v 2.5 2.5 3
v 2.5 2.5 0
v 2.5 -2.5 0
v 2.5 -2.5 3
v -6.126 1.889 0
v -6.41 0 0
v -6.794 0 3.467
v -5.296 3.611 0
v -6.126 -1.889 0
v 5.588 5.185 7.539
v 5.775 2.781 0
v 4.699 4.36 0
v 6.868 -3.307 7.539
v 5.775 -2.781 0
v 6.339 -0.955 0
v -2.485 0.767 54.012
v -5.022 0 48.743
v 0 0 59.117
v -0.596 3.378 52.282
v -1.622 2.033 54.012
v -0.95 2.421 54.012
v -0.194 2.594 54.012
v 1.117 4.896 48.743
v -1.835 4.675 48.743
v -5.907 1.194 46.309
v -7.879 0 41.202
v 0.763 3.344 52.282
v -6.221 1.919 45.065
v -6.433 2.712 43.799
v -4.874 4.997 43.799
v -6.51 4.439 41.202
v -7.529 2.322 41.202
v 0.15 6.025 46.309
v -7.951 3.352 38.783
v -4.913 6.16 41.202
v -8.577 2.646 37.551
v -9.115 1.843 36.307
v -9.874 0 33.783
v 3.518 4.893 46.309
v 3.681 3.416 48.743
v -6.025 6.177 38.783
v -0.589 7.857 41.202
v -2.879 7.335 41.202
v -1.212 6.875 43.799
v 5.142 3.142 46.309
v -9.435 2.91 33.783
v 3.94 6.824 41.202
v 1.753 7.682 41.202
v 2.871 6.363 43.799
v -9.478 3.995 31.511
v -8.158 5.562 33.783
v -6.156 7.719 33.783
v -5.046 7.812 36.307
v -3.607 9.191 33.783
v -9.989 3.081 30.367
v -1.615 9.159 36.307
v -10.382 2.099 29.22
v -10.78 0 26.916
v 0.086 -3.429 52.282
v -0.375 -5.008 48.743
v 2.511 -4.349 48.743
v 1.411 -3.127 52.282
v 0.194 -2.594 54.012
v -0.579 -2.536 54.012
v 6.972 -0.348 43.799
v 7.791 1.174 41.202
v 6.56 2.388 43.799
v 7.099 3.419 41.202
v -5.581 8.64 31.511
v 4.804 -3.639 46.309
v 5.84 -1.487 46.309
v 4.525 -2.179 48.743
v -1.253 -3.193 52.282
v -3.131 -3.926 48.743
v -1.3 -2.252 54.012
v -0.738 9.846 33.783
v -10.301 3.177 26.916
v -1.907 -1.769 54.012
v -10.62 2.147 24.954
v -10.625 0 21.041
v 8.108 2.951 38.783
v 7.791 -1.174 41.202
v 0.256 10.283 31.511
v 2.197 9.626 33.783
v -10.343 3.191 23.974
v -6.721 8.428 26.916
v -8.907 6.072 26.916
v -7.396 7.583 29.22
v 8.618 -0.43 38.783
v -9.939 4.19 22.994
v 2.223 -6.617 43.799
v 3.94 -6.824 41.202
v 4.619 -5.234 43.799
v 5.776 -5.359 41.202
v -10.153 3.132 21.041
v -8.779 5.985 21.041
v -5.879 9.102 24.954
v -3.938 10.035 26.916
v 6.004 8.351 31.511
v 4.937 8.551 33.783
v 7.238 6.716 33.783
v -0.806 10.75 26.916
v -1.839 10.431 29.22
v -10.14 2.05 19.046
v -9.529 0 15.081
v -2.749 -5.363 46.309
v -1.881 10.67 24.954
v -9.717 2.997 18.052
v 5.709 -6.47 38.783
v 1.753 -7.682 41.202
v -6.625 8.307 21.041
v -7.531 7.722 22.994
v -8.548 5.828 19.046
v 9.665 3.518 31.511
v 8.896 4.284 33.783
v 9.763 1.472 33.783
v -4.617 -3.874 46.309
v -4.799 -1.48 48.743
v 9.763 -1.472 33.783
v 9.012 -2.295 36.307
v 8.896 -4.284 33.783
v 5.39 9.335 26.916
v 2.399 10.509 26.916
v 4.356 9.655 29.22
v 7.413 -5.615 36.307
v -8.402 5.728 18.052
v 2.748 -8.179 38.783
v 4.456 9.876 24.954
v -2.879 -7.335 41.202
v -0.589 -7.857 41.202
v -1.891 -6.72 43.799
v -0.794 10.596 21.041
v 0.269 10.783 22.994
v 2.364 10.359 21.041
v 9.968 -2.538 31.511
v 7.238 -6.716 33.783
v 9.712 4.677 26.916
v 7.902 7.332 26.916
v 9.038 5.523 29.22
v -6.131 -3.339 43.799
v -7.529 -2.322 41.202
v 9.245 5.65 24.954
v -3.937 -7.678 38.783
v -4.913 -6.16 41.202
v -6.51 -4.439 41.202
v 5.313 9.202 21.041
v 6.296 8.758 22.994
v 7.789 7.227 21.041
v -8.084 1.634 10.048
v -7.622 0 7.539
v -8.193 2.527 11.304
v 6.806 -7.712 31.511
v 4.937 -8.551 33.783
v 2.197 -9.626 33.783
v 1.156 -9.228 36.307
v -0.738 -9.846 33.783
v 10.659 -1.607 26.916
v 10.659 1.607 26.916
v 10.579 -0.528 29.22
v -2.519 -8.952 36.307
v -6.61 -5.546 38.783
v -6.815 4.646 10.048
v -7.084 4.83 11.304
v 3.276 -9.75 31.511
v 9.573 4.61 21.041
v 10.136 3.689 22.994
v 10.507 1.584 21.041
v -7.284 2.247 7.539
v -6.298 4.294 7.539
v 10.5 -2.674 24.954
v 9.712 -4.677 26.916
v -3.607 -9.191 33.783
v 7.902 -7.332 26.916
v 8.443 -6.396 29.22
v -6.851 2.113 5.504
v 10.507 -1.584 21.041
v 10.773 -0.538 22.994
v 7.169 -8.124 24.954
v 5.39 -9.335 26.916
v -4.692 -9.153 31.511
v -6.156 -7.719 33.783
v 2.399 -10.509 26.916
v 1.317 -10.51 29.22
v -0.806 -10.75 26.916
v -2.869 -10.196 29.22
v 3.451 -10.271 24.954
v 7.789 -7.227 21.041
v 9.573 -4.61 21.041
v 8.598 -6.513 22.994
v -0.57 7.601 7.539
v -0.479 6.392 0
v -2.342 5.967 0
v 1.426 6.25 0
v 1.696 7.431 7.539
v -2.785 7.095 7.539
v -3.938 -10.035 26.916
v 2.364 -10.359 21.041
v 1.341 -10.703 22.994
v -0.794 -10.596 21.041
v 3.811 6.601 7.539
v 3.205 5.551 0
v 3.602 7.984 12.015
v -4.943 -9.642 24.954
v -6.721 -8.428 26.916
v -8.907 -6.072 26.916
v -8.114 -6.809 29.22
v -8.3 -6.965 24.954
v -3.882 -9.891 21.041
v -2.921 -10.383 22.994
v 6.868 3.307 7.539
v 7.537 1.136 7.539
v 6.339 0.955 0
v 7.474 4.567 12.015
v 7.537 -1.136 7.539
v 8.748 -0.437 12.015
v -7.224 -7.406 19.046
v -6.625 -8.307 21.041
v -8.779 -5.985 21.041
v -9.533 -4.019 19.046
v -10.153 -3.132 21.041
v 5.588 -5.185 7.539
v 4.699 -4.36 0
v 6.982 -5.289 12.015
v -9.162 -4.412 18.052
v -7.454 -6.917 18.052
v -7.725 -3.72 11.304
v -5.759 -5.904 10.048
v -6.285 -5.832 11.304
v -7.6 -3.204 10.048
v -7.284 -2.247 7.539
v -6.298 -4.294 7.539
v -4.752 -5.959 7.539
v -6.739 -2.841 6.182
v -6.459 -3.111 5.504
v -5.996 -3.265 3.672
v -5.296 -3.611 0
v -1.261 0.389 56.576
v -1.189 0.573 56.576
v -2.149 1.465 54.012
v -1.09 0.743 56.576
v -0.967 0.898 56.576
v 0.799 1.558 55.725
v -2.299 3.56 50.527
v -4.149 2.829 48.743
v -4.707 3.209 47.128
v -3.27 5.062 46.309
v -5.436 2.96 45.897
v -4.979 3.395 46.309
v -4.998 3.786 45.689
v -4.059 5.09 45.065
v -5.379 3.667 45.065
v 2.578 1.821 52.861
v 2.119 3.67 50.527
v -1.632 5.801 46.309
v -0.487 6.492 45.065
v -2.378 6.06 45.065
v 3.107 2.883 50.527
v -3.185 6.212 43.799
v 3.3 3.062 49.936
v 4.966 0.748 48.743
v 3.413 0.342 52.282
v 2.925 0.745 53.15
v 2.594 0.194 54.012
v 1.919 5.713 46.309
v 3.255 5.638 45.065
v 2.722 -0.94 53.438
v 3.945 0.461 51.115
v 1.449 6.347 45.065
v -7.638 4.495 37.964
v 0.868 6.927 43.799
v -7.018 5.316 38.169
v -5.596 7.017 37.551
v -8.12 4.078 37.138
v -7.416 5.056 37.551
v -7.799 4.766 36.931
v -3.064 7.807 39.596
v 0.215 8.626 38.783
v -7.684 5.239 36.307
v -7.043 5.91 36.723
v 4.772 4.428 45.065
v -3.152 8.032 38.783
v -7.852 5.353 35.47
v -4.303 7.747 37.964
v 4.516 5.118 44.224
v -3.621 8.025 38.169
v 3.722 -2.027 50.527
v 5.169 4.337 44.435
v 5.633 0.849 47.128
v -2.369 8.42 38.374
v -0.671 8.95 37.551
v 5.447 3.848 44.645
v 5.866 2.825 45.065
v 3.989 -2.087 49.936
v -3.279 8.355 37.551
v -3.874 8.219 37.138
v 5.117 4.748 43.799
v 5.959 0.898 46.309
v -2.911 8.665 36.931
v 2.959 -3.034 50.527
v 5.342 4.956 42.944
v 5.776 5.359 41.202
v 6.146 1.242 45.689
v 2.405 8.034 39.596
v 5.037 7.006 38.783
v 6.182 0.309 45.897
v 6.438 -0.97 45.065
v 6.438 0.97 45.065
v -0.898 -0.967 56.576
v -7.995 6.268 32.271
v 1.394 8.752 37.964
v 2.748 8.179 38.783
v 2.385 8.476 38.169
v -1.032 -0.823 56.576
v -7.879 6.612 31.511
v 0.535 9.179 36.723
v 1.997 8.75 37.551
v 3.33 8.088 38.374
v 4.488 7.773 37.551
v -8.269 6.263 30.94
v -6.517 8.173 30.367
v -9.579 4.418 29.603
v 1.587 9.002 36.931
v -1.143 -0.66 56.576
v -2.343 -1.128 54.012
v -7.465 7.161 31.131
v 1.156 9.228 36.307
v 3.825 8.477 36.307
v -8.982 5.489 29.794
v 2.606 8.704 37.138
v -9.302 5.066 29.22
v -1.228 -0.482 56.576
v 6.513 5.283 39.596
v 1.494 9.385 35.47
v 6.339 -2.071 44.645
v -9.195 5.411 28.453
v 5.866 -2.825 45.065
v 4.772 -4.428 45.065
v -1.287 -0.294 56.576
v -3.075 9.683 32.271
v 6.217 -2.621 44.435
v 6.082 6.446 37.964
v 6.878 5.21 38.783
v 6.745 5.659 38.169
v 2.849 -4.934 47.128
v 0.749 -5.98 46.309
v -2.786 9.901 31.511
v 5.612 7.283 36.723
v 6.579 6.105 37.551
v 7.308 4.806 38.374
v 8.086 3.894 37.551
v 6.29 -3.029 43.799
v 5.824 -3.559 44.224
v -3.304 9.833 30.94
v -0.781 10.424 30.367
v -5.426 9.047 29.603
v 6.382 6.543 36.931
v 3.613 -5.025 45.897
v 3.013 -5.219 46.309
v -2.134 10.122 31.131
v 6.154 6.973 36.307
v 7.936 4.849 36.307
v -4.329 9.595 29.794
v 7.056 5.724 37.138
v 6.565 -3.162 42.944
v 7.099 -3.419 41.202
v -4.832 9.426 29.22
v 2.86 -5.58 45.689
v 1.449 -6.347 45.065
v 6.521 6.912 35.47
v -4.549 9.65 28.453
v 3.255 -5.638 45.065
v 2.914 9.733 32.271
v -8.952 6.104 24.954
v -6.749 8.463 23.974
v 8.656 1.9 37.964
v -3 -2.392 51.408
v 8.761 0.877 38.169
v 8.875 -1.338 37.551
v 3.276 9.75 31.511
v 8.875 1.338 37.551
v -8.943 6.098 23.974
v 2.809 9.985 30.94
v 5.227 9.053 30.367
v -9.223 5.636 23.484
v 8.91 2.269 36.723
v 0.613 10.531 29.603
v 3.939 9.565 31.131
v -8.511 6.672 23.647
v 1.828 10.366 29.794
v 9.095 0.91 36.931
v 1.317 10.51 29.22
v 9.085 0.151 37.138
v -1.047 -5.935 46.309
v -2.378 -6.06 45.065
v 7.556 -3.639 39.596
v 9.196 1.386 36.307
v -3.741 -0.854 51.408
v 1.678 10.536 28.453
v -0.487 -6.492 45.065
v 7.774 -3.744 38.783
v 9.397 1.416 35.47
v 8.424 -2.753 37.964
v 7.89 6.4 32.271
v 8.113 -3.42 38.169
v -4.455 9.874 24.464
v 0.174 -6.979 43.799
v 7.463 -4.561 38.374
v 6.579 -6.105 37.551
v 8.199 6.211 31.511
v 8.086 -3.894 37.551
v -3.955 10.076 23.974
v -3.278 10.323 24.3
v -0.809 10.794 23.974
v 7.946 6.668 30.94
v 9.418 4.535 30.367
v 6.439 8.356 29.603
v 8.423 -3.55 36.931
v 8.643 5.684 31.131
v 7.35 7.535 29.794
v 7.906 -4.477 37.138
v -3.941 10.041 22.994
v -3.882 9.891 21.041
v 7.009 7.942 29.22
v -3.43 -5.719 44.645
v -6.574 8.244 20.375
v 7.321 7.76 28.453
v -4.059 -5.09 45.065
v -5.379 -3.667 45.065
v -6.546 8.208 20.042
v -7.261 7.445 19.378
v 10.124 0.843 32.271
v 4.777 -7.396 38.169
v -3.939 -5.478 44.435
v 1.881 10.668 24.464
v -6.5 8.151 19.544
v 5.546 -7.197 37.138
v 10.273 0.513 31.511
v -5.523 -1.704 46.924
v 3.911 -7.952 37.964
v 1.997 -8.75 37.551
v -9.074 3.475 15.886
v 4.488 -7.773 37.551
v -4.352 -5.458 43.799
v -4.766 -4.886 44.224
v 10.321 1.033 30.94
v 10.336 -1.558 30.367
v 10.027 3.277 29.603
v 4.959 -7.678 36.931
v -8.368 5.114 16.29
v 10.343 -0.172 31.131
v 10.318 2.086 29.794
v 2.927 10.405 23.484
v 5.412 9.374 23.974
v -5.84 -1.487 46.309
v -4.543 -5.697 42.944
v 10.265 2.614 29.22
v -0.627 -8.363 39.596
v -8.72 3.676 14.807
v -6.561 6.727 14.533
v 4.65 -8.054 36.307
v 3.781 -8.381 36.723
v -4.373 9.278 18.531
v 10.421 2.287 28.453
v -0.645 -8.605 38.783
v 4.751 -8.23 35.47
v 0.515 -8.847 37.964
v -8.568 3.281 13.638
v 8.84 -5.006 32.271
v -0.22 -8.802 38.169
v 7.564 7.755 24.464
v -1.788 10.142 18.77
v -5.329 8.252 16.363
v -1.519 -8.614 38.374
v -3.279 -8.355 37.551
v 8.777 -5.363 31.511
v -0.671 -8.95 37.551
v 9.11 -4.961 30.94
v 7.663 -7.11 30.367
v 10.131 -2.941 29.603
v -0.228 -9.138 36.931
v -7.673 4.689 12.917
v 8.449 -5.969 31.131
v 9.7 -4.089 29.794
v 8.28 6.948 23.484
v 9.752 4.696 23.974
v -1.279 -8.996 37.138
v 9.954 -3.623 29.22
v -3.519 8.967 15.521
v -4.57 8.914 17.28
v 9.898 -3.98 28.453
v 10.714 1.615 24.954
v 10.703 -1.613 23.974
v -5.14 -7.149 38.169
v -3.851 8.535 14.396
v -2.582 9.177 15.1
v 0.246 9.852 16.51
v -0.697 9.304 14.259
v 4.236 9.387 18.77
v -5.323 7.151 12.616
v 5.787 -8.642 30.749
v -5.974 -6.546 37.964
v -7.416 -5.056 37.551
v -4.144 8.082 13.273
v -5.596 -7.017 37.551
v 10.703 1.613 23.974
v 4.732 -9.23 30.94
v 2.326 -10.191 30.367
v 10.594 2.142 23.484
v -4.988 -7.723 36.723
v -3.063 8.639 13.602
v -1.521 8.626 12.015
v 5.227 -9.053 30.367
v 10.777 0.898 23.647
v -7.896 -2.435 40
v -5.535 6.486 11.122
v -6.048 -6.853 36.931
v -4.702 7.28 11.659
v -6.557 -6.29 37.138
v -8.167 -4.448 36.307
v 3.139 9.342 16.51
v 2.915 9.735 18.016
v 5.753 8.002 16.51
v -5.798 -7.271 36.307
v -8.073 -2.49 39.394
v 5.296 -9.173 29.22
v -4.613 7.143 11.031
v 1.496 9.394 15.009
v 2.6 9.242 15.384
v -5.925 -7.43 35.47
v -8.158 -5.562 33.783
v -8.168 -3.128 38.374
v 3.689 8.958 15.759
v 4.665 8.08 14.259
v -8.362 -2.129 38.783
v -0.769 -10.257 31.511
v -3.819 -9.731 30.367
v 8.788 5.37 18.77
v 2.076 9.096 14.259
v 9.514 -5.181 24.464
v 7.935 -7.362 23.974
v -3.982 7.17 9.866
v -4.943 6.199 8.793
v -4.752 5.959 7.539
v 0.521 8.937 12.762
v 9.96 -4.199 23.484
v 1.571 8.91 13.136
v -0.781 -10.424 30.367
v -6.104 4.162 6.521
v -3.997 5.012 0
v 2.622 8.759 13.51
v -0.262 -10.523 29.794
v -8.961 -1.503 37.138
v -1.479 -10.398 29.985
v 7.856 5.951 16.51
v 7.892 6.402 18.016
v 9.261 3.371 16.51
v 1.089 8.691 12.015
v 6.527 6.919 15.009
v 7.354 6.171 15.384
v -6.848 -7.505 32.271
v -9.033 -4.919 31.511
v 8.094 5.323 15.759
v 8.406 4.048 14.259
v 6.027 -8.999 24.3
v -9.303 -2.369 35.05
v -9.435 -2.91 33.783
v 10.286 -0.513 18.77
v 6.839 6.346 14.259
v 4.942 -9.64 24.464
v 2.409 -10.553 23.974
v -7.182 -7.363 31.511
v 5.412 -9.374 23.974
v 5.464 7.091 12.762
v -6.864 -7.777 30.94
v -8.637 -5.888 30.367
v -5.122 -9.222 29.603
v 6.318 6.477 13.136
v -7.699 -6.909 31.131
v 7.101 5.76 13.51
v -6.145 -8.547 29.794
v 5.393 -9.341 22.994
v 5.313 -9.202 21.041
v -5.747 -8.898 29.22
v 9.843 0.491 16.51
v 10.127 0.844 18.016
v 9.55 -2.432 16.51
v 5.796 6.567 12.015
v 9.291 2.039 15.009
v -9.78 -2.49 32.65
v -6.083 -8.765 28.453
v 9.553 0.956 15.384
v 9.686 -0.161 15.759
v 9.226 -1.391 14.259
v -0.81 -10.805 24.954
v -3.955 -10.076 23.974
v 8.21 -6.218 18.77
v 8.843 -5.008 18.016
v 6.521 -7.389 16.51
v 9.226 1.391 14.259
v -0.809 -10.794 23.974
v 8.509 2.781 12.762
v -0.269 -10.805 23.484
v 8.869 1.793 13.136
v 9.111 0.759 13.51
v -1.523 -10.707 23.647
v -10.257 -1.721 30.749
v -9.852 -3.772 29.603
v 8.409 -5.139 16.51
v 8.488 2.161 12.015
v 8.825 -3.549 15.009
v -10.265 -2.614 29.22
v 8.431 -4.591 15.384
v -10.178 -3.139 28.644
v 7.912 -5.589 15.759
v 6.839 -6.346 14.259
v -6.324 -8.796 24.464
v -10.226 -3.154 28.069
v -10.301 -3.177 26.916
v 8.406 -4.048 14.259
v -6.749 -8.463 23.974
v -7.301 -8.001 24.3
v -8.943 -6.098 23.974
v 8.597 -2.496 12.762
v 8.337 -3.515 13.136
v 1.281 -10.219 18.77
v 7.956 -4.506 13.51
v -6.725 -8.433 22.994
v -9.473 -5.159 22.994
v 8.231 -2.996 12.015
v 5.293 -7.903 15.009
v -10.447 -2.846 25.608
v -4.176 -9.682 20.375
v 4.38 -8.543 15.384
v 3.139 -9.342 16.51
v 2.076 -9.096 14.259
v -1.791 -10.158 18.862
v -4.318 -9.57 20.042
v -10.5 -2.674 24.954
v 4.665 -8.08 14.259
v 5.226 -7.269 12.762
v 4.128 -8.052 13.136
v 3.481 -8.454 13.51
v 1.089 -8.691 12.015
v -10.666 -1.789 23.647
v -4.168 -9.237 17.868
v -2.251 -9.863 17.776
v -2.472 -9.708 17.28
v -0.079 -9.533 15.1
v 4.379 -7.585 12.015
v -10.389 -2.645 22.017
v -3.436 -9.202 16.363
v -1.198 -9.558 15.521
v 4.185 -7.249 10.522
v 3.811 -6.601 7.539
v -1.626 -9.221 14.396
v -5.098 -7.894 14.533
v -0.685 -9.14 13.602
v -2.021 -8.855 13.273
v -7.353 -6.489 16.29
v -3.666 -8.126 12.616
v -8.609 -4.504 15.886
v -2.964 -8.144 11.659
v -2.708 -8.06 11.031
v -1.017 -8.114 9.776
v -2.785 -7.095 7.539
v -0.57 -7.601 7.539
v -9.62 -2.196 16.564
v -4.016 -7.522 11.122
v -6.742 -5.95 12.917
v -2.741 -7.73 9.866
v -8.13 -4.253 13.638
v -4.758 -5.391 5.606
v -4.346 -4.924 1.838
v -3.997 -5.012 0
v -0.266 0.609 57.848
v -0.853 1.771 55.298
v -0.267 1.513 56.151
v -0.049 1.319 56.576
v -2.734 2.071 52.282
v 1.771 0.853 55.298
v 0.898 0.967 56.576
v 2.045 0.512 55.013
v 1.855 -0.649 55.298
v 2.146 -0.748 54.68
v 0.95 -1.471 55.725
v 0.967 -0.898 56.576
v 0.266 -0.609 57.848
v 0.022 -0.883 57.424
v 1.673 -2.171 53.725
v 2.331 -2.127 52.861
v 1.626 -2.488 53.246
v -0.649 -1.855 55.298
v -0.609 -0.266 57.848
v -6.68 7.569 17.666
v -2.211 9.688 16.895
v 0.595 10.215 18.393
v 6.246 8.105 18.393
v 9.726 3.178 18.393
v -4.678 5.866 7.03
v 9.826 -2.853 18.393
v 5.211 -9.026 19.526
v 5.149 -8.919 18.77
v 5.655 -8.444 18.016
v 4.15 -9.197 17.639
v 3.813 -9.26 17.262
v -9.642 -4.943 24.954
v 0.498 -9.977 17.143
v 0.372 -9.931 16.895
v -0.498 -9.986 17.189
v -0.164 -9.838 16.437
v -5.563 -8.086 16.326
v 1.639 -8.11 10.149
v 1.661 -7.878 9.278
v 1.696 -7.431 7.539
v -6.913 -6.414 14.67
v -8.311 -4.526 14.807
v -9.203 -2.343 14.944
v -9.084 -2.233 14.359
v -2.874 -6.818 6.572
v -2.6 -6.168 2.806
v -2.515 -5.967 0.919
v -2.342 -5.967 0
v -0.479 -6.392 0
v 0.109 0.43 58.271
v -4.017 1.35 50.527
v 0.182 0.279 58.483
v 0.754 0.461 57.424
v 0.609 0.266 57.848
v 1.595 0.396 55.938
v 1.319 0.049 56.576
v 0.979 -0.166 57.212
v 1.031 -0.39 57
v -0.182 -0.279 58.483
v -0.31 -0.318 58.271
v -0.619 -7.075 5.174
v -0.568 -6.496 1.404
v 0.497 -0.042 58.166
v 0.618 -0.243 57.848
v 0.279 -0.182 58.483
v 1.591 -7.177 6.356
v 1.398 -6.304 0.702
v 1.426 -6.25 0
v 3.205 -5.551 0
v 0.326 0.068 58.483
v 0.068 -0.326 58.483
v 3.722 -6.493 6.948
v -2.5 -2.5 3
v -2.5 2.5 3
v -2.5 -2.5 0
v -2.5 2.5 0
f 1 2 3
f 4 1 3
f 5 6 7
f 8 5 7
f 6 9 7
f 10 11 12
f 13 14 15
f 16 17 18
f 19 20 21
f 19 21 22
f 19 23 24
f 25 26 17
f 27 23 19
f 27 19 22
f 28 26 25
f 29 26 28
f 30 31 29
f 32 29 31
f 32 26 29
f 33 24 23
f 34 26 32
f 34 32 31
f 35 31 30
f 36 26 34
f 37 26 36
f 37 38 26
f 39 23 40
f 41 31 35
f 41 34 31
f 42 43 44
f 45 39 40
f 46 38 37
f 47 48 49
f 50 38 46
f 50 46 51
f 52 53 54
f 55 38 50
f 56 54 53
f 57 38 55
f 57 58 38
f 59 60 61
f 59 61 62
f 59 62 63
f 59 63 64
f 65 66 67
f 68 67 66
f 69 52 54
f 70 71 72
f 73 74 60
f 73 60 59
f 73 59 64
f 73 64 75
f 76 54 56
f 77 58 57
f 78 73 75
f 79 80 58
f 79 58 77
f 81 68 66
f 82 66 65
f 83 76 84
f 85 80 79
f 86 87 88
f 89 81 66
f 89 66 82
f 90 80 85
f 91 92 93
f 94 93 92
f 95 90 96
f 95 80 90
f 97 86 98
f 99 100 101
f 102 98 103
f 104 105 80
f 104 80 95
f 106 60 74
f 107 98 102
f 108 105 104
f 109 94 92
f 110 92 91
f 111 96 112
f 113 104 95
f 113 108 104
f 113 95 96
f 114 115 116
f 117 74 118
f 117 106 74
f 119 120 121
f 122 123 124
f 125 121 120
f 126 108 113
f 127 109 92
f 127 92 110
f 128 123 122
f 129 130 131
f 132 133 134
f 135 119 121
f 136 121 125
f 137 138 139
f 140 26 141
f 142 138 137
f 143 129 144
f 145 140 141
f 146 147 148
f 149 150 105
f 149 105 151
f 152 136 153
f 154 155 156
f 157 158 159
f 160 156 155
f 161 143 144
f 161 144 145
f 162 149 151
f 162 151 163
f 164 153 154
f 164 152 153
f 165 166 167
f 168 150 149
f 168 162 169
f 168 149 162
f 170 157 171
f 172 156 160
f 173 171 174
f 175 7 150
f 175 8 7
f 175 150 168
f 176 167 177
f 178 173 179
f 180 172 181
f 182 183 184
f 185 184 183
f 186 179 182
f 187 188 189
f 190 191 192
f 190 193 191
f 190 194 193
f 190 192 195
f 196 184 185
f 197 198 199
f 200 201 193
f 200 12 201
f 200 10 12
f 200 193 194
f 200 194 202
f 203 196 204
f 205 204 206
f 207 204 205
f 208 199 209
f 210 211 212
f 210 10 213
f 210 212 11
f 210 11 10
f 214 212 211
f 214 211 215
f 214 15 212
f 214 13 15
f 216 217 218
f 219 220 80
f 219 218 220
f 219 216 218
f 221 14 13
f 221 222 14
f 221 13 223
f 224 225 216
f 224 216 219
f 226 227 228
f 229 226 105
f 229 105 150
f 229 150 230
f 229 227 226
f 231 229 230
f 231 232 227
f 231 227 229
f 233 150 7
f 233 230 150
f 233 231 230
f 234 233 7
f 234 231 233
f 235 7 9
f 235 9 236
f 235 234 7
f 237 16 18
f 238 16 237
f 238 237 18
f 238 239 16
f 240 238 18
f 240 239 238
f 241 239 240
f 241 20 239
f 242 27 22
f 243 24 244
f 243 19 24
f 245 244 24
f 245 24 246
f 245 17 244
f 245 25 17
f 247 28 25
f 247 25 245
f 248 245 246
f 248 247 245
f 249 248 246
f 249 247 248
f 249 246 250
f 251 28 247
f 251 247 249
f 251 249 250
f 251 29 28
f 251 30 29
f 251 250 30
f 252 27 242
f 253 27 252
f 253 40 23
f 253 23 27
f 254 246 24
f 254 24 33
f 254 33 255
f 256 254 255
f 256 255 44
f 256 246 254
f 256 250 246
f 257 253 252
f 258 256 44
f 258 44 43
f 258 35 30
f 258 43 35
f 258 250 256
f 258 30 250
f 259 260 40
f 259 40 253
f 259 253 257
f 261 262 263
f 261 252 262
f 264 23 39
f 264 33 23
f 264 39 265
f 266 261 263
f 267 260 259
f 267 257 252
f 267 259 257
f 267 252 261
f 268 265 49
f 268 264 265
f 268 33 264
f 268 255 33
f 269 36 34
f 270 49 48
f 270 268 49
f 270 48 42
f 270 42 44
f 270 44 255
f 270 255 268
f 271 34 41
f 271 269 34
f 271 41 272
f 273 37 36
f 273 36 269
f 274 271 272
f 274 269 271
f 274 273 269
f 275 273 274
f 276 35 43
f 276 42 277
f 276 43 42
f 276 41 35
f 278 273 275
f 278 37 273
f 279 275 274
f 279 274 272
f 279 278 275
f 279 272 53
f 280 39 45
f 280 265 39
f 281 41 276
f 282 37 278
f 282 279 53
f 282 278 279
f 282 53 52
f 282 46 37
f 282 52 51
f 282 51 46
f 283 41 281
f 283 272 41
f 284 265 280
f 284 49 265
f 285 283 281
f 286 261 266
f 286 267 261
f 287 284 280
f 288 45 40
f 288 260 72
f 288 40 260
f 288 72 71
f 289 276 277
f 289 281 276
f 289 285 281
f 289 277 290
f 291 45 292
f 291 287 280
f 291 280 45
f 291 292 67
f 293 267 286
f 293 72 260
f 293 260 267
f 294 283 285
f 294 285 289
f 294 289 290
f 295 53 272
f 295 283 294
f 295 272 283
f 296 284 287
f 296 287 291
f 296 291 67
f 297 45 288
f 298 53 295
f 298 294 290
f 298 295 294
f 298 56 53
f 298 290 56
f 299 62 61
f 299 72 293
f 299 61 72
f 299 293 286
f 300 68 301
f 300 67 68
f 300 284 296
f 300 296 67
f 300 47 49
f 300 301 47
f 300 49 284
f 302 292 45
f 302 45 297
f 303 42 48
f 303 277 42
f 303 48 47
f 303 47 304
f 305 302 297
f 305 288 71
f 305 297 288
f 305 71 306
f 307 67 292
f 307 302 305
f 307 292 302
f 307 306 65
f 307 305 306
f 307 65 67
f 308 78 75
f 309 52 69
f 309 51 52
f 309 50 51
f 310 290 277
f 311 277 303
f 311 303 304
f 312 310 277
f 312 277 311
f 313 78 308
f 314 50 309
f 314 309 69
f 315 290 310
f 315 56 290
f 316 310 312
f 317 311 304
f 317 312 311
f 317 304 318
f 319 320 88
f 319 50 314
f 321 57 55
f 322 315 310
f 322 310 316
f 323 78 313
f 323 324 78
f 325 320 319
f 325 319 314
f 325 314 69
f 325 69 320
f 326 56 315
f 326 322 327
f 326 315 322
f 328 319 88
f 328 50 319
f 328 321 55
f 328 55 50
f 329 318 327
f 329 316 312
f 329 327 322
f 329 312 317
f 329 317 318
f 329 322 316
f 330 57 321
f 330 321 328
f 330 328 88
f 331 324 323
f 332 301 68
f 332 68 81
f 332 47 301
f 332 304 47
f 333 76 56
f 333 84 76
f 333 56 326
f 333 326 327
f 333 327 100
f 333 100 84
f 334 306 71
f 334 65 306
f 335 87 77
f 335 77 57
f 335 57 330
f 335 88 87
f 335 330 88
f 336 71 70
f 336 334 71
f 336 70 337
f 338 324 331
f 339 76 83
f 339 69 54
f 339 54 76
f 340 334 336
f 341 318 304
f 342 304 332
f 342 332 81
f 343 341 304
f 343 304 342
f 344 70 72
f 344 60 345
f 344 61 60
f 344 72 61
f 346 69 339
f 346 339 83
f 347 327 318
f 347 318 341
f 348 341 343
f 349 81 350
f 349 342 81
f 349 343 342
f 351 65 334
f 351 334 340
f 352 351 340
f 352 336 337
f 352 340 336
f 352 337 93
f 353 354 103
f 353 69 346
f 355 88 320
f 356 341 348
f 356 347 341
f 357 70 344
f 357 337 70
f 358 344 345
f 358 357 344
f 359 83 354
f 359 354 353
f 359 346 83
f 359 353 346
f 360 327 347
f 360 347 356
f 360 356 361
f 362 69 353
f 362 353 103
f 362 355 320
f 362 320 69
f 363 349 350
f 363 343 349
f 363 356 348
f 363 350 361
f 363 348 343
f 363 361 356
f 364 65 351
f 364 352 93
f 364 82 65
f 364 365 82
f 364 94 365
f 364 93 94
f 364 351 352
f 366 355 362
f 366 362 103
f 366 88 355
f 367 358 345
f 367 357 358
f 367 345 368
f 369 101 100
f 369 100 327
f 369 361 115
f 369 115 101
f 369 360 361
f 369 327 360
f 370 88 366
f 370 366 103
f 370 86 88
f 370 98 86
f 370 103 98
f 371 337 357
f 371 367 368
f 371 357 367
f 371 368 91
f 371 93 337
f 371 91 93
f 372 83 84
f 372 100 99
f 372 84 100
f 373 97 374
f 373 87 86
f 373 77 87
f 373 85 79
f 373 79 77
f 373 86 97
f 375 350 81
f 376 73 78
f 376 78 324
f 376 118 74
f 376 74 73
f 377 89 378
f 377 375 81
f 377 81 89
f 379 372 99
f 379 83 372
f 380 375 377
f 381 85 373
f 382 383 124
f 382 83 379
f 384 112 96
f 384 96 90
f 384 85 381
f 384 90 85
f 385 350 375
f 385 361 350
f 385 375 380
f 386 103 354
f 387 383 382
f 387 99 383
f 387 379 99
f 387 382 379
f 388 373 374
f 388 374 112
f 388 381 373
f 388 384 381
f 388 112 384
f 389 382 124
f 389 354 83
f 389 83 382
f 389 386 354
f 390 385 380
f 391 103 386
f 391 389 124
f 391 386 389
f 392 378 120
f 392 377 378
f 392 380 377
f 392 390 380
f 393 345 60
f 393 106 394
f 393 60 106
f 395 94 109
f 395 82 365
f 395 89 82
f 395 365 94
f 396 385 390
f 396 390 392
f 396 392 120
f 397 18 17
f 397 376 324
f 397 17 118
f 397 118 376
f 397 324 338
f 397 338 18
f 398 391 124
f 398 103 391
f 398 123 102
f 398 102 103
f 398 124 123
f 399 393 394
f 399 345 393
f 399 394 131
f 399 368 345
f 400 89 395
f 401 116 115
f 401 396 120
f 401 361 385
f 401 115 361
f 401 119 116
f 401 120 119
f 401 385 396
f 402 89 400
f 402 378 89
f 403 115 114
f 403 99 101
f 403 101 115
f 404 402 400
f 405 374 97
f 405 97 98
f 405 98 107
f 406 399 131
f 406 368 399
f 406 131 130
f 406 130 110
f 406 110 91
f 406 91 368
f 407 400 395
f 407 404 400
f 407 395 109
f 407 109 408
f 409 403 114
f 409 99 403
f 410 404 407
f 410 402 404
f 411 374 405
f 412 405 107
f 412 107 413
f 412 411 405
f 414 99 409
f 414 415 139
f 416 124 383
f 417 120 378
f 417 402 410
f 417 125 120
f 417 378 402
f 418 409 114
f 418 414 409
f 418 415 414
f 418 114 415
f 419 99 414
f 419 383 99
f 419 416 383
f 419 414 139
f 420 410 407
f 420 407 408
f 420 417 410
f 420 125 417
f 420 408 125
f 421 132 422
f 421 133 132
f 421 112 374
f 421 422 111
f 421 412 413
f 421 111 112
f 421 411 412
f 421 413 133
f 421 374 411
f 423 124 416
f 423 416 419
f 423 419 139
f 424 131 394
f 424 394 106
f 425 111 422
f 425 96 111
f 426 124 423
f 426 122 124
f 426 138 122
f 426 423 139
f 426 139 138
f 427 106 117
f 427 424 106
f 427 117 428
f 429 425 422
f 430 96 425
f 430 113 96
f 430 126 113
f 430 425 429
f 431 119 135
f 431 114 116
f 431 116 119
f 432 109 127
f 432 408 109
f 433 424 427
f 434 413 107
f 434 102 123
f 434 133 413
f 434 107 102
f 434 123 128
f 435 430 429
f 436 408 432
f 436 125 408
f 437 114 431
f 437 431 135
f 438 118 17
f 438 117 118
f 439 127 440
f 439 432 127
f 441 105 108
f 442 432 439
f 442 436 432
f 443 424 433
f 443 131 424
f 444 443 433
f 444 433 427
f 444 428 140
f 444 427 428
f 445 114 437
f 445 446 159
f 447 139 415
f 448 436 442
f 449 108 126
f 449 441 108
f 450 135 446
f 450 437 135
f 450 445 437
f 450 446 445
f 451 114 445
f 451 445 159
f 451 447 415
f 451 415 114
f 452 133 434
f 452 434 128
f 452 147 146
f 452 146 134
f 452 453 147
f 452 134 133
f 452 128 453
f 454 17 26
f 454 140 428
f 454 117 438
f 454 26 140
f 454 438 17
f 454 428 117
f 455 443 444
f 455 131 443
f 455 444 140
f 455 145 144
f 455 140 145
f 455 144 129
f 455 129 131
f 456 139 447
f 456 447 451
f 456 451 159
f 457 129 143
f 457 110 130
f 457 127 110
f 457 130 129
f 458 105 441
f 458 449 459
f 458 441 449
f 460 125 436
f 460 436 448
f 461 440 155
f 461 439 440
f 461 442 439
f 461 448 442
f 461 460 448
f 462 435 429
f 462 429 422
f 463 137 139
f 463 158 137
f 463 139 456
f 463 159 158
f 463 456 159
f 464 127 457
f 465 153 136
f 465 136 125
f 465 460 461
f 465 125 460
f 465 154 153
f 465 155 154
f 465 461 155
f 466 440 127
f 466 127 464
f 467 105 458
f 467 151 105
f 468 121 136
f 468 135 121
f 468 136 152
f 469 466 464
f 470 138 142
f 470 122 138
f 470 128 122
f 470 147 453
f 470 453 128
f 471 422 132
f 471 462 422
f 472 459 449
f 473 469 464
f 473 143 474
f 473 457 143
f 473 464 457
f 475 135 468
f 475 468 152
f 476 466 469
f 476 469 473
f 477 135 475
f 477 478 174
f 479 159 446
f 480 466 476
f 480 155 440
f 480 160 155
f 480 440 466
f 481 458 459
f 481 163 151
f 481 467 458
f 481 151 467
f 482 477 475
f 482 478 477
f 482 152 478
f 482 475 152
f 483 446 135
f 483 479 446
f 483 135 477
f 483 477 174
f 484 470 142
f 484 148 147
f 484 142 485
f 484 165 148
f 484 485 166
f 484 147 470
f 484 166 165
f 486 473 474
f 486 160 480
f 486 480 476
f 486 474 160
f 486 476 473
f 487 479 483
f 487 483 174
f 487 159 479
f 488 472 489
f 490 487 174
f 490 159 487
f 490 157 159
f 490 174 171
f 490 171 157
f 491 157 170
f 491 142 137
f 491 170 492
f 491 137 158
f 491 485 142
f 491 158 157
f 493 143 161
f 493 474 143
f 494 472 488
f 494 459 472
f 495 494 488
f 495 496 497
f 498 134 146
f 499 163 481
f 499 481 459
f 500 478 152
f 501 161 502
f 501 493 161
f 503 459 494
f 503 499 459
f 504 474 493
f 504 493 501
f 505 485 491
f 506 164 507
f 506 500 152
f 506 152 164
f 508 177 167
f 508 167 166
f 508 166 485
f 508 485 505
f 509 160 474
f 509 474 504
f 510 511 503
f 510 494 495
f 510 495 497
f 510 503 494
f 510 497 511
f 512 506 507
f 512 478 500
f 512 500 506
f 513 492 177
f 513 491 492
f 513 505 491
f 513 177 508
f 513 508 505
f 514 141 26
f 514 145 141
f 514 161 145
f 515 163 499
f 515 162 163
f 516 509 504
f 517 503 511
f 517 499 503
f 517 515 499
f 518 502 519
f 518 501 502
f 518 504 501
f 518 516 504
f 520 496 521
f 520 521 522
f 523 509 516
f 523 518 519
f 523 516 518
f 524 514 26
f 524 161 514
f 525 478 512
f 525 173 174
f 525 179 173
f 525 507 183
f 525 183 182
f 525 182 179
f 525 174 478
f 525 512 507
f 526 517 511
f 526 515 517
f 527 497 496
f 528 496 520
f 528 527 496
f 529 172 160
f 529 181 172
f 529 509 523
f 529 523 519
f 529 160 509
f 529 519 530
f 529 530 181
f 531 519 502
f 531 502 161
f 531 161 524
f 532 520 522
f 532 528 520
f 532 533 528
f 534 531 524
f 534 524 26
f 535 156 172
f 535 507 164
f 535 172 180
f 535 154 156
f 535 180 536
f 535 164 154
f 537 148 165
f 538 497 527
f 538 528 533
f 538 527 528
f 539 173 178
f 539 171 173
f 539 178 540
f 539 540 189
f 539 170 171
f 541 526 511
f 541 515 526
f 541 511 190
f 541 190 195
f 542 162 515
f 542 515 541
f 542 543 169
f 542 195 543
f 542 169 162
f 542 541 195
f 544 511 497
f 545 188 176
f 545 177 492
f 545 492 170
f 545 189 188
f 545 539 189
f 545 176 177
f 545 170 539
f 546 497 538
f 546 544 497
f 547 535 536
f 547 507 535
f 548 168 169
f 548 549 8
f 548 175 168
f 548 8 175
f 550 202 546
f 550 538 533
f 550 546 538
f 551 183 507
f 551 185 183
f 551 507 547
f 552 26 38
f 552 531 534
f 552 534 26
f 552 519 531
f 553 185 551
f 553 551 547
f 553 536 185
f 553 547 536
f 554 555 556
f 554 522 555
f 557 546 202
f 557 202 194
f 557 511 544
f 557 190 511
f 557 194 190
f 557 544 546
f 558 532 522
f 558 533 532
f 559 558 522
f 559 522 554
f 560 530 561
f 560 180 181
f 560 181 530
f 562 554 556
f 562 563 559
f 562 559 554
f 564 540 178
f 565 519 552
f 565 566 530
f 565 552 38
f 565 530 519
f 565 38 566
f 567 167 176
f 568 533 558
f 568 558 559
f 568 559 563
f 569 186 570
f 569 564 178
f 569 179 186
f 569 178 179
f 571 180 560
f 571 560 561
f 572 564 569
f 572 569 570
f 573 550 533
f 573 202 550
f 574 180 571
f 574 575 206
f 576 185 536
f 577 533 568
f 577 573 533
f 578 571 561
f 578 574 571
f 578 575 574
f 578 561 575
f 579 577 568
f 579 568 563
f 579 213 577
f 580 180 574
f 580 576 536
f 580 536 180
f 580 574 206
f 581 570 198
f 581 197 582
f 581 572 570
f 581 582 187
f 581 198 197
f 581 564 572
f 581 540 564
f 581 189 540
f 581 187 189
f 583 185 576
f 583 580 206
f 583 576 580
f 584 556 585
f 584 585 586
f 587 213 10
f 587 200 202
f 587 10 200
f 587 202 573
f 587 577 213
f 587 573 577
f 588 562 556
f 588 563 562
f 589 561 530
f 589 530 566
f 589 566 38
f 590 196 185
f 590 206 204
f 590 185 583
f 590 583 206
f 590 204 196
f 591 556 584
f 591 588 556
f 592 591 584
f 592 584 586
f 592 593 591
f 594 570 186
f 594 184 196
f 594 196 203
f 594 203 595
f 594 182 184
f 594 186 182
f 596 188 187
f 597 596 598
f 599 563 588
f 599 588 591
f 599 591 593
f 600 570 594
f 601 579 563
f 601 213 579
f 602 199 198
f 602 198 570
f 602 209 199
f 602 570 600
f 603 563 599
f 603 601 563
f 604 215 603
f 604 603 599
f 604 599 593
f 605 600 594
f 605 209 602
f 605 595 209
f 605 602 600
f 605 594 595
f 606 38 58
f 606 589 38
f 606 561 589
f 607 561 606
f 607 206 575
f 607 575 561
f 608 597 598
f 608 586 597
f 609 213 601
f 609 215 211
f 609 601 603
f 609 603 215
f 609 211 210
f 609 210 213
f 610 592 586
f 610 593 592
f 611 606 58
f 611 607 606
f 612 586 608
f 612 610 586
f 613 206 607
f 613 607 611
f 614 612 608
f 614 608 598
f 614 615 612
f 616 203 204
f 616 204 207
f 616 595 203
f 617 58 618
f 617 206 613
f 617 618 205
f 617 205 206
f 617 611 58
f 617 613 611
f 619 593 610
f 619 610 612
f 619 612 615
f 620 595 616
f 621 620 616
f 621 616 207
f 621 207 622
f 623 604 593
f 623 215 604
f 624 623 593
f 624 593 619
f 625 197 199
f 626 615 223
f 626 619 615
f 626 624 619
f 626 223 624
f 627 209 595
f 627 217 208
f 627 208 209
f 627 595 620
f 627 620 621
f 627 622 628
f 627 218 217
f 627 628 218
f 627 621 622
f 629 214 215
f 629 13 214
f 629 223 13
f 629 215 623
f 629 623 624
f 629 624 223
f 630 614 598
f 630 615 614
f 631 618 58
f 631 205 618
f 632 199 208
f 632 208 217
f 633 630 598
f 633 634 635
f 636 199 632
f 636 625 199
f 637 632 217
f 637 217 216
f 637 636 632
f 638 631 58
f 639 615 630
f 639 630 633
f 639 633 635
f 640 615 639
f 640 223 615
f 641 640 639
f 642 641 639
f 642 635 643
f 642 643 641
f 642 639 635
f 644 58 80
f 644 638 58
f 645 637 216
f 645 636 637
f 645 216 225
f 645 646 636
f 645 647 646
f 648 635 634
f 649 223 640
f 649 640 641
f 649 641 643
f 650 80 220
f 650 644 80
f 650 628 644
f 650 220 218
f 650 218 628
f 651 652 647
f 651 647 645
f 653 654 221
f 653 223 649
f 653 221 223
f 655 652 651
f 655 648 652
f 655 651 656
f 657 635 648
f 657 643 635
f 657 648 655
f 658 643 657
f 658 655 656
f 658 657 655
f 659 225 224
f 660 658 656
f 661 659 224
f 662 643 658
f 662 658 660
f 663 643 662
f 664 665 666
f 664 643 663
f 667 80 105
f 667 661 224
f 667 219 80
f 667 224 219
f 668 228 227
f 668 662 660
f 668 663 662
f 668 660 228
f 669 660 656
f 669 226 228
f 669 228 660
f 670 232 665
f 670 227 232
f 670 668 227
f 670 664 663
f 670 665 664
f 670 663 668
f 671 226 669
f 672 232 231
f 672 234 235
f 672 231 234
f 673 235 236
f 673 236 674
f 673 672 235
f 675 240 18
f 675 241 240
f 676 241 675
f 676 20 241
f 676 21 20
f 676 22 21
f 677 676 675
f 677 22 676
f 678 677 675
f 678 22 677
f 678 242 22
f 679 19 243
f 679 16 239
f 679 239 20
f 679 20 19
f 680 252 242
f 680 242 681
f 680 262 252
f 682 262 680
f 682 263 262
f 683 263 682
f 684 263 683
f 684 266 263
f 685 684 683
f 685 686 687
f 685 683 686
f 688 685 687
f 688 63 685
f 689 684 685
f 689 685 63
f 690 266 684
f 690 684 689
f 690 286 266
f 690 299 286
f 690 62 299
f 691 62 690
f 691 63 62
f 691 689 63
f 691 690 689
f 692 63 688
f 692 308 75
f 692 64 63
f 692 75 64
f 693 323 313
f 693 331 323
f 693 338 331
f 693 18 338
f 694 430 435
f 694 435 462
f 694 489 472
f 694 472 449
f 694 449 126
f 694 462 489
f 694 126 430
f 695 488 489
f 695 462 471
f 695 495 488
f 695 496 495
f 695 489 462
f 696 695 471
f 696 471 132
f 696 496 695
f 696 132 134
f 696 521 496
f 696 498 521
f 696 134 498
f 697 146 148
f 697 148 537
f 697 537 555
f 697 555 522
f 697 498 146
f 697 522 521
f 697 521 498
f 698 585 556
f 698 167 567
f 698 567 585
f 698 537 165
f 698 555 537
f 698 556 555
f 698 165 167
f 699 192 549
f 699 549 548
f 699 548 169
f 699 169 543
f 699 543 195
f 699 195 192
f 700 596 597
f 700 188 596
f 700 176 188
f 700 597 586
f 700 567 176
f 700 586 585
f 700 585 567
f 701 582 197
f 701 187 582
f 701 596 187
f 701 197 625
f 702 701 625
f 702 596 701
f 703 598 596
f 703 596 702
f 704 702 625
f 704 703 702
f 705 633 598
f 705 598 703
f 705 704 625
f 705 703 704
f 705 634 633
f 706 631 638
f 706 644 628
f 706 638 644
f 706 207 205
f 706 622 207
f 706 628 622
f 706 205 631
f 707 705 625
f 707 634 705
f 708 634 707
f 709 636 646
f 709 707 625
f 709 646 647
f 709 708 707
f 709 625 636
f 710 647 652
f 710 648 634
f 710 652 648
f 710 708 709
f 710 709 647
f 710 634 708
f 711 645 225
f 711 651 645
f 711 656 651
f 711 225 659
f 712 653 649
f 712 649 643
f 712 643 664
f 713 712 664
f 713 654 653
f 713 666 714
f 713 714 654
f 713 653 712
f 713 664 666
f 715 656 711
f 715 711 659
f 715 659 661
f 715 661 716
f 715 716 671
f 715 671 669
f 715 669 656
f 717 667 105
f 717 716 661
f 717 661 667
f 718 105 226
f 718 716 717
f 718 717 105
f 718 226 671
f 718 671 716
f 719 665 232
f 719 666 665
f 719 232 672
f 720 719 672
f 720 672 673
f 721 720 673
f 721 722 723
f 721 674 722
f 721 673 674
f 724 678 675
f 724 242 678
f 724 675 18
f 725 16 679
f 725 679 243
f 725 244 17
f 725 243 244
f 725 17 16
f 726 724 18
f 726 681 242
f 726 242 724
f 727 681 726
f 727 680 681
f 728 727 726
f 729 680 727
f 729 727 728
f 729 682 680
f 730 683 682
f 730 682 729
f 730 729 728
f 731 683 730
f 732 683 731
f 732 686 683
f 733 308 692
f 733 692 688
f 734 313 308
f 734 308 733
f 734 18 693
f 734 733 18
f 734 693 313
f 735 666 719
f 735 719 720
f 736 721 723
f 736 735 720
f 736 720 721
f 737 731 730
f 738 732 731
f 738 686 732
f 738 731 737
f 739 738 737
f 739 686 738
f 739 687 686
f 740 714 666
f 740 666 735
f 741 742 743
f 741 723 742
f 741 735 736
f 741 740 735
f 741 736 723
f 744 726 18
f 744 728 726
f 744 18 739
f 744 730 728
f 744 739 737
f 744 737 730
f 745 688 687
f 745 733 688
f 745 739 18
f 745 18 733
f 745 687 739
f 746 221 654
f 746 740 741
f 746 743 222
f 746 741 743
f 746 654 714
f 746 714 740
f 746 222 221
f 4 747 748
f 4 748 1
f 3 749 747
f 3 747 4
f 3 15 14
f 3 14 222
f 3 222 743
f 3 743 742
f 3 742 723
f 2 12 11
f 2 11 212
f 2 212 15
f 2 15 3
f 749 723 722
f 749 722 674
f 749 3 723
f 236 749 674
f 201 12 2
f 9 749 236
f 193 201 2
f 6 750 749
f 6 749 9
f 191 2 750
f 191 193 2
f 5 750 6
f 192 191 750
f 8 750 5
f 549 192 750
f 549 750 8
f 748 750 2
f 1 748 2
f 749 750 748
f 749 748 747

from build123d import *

# Parameters (mm, degrees)
F3_W     = 5
F3_H     = 5
F4_DEPTH = 3


with BuildPart() as f2:
    # F0 (on Front) → F2 (revolve)
    with BuildSketch(Plane.XZ):
        with BuildLine():
            Line((0, 0), (0, 59.1171830893))
            add(Edge.make_bspline(
                [(0, 59.1171830893), (-2.7381684295, 53.9204760508), (-8.0451749302, 43.0126236449), (-13.1291565791, 21.2866872374), (-6.8016306182, 7.2027664188), (-6.4102956094, 0)],
                knots=[0, 0, 0, 0, 0.3126235846, 0.6538036512, 1, 1, 1, 1], degree=3))
            Line((-6.4102956094, 0), (0, 0))
        make_face()
    revolve(axis=Axis((0, 0, 20.6554001197), (0, 0, -1)))

    # F3 (on face) → F4 (cut)
    with BuildSketch(Plane(origin=(0, 0, 0), x_dir=(1, 0, 0), z_dir=(0, 0, -1))):
        Rectangle(F3_W, F3_H)
    extrude(amount=-F4_DEPTH, mode=Mode.SUBTRACT)


solid = f2.part
